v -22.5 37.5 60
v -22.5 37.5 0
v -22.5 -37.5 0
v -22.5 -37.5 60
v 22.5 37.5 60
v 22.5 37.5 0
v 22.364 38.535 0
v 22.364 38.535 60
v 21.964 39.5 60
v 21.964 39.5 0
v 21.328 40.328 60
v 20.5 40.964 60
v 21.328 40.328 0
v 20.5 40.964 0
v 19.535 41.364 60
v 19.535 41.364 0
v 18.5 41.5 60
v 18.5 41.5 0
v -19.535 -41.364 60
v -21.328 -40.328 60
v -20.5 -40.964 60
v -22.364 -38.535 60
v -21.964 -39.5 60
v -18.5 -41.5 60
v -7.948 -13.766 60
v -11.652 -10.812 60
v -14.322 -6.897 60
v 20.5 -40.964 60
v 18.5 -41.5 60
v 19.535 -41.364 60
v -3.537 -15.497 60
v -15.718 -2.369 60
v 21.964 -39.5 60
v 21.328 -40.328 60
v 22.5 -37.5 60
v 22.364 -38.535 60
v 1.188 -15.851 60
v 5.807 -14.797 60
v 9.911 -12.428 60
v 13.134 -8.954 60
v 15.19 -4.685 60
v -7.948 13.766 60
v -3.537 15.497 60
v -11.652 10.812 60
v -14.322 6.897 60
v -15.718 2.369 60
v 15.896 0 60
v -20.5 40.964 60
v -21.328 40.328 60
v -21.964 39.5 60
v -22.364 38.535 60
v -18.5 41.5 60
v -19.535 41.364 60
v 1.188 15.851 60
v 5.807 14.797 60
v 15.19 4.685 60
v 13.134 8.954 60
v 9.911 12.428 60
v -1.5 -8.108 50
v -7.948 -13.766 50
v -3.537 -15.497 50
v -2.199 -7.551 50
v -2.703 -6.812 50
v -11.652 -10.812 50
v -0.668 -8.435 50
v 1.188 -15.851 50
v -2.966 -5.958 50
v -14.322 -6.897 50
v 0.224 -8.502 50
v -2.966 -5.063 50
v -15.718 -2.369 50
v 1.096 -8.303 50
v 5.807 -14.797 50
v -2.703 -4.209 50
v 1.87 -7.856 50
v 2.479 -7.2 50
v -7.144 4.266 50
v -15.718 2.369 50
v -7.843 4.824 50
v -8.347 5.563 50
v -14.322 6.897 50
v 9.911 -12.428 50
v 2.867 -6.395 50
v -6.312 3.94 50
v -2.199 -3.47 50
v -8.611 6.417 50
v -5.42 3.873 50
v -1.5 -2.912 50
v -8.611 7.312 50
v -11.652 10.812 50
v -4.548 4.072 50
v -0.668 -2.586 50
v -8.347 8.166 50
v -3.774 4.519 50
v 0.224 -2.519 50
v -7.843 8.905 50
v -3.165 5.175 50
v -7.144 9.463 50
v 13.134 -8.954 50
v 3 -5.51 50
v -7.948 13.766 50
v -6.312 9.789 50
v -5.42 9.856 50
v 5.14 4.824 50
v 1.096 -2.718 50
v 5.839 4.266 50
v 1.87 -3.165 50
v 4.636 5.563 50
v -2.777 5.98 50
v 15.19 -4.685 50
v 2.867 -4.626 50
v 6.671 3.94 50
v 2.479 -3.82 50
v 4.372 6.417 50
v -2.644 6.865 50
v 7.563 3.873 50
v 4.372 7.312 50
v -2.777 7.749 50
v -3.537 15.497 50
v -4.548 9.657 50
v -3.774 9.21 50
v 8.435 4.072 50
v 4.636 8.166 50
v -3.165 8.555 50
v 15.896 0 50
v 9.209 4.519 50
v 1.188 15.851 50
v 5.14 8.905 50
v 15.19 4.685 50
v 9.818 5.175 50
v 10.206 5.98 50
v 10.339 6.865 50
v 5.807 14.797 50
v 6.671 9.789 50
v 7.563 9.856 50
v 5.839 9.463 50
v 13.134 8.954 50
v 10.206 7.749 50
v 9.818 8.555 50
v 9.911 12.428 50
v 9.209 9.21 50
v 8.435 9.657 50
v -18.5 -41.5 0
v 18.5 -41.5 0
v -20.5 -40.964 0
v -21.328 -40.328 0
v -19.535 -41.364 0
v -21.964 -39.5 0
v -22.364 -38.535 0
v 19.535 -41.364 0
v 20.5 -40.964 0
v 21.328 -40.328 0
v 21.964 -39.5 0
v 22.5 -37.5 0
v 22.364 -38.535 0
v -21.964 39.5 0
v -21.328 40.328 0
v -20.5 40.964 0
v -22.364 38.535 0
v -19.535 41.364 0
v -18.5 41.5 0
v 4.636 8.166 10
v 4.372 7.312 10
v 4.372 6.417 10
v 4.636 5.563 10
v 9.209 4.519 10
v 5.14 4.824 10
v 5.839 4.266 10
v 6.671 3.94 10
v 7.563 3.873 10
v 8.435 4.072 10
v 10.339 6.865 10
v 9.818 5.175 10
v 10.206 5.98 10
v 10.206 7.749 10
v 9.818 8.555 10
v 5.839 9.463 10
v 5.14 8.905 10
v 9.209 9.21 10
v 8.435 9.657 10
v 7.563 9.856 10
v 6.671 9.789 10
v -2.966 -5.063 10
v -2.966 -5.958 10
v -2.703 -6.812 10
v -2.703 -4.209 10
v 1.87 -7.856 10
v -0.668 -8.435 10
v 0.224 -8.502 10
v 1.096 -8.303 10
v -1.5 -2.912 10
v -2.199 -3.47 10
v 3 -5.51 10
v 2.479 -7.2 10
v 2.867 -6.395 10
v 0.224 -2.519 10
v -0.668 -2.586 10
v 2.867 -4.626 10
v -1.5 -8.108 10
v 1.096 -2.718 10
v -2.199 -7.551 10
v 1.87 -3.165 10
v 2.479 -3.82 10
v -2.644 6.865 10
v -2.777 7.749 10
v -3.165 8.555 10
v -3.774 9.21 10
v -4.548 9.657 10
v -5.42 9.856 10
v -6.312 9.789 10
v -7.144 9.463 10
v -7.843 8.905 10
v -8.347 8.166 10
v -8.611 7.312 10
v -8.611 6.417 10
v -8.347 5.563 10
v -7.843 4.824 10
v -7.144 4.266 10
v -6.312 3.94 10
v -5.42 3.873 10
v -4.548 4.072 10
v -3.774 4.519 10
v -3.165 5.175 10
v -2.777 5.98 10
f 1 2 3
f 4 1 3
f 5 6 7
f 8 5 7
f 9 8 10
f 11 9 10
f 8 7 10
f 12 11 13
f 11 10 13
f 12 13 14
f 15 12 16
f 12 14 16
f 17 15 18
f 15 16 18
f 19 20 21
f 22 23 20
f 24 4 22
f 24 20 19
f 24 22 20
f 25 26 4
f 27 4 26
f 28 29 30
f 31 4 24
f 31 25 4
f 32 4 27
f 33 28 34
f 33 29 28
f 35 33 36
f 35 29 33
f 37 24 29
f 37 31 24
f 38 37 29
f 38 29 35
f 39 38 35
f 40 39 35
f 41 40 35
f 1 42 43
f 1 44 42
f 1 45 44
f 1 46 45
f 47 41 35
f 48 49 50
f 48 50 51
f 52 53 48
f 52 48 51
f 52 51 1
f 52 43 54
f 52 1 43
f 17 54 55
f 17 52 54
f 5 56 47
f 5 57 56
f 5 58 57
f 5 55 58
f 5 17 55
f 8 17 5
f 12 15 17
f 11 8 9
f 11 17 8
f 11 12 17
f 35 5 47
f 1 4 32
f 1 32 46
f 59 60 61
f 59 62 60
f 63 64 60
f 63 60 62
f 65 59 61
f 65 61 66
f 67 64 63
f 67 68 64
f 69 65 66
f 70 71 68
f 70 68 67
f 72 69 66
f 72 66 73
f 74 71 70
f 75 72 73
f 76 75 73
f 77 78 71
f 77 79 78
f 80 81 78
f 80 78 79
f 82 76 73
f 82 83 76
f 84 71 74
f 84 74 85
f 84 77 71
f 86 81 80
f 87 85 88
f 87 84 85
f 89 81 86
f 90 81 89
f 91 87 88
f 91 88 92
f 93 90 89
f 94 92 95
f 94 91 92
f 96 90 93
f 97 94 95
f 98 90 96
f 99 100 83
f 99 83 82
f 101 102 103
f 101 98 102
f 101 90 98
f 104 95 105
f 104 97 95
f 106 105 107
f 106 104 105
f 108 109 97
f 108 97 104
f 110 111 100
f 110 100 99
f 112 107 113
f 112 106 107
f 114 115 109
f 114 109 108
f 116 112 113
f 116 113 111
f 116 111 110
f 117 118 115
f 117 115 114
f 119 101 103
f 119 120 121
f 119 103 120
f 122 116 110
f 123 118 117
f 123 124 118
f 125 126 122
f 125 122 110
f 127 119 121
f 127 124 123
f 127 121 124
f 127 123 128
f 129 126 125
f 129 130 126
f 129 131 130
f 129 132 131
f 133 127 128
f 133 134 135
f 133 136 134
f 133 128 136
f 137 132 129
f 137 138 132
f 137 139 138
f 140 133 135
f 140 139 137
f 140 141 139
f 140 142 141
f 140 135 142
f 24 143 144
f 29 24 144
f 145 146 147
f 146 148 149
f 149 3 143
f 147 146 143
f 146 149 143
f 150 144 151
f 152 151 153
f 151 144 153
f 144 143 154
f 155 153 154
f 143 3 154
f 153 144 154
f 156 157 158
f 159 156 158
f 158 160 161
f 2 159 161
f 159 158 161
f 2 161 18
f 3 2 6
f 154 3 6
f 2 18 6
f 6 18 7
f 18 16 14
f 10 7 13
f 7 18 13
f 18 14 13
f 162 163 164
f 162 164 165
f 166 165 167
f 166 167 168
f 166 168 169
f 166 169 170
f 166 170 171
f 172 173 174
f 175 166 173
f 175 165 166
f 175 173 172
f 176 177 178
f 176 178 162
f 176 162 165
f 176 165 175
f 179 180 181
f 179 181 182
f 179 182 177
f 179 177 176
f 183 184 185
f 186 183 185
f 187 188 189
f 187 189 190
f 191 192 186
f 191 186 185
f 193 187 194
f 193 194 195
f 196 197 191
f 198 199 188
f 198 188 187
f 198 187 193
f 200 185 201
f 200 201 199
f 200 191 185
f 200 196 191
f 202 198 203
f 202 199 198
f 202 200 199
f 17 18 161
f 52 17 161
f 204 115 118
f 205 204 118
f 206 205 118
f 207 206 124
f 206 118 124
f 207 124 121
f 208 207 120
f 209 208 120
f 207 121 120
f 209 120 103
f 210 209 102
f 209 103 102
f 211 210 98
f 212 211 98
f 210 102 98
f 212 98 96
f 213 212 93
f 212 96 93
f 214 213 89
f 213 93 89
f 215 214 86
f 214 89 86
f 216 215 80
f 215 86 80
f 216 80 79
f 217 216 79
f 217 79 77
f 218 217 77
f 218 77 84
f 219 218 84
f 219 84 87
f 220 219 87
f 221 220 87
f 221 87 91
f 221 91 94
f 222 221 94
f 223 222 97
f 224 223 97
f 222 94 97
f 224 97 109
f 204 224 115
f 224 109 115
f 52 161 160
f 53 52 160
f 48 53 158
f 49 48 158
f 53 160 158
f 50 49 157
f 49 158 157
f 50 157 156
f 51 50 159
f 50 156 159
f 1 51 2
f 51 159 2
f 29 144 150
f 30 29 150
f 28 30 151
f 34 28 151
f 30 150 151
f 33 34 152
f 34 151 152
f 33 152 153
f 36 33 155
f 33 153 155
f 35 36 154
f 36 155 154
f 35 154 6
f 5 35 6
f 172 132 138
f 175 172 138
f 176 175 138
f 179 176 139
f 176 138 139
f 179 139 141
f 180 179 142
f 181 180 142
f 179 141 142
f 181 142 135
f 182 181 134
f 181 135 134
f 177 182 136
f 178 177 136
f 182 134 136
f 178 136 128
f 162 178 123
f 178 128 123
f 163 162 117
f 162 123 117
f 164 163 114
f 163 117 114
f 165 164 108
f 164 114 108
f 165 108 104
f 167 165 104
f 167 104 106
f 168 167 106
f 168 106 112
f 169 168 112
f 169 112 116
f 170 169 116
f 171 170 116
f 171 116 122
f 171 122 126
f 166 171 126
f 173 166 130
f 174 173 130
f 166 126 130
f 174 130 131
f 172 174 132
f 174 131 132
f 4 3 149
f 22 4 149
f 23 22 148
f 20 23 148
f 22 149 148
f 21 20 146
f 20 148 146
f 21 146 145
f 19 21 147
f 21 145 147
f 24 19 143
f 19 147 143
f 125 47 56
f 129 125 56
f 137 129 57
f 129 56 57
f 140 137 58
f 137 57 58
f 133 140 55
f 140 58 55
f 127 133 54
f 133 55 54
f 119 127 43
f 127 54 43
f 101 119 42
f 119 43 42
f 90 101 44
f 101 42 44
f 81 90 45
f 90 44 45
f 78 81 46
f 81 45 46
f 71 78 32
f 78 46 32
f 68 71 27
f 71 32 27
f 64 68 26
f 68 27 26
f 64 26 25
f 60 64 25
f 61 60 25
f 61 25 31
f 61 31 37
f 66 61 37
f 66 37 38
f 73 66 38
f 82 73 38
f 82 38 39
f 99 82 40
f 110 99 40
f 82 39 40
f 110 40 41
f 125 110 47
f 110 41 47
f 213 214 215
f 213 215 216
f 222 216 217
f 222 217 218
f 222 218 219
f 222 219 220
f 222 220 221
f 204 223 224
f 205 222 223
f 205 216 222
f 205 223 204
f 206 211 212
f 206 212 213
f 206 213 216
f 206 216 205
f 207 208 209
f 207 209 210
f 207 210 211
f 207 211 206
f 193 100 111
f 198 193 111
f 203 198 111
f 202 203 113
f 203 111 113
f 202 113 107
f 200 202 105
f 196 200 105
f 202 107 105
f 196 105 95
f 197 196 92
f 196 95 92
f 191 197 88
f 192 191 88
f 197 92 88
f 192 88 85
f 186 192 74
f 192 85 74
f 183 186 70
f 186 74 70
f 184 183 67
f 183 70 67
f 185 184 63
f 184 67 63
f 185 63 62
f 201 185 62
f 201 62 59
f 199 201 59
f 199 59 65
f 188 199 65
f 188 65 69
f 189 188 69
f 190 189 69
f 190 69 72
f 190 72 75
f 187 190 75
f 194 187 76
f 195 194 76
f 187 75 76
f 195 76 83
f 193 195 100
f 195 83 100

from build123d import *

# Parameters (mm, degrees)
BOSS_EXTRUDE1_DEPTH = 60
SKETCH3_R           = 15.895839237
CUT_EXTRUDE1_DEPTH  = 10
SKETCH4_R           = 3
CUT_EXTRUDE2_DEPTH  = 40


with BuildPart() as part:
    # Sketch2 → Boss-Extrude1 (new body)
    with BuildSketch(Plane.XY):
        with BuildLine():
            Line((-18.5, -41.5), (18.5, -41.5))
            ThreePointArc((18.5, -41.5), (21.328427125, -40.328427125), (22.5, -37.5))
            Line((22.5, -37.5), (22.5, 37.5))
            ThreePointArc((22.5, 37.5), (21.328427125, 40.328427125), (18.5, 41.5))
            Line((18.5, 41.5), (-18.5, 41.5))
            ThreePointArc((-18.5, 41.5), (-21.328427125, 40.328427125), (-22.5, 37.5))
            Line((-22.5, 37.5), (-22.5, -37.5))
            ThreePointArc((-22.5, -37.5), (-21.328427125, -40.328427125), (-18.5, -41.5))
        make_face()
    extrude(amount=BOSS_EXTRUDE1_DEPTH)

    # Sketch3 → Cut-Extrude1 (cut)
    with BuildSketch(Plane.XY.offset(60)):
        Circle(SKETCH3_R)
    extrude(amount=-CUT_EXTRUDE1_DEPTH, mode=Mode.SUBTRACT)

    # Sketch4 → Cut-Extrude2 (cut)
    with BuildSketch(Plane.XY.offset(50)):
        with Locations((7.338844811, 6.864557304)):
            Circle(SKETCH4_R)
        with Locations((-5.644149057, 6.864557304)):
            Circle(SKETCH4_R)
        with Locations((0, -5.510422777)):
            Circle(SKETCH4_R)
    extrude(amount=-CUT_EXTRUDE2_DEPTH, mode=Mode.SUBTRACT)


solid = part.part
